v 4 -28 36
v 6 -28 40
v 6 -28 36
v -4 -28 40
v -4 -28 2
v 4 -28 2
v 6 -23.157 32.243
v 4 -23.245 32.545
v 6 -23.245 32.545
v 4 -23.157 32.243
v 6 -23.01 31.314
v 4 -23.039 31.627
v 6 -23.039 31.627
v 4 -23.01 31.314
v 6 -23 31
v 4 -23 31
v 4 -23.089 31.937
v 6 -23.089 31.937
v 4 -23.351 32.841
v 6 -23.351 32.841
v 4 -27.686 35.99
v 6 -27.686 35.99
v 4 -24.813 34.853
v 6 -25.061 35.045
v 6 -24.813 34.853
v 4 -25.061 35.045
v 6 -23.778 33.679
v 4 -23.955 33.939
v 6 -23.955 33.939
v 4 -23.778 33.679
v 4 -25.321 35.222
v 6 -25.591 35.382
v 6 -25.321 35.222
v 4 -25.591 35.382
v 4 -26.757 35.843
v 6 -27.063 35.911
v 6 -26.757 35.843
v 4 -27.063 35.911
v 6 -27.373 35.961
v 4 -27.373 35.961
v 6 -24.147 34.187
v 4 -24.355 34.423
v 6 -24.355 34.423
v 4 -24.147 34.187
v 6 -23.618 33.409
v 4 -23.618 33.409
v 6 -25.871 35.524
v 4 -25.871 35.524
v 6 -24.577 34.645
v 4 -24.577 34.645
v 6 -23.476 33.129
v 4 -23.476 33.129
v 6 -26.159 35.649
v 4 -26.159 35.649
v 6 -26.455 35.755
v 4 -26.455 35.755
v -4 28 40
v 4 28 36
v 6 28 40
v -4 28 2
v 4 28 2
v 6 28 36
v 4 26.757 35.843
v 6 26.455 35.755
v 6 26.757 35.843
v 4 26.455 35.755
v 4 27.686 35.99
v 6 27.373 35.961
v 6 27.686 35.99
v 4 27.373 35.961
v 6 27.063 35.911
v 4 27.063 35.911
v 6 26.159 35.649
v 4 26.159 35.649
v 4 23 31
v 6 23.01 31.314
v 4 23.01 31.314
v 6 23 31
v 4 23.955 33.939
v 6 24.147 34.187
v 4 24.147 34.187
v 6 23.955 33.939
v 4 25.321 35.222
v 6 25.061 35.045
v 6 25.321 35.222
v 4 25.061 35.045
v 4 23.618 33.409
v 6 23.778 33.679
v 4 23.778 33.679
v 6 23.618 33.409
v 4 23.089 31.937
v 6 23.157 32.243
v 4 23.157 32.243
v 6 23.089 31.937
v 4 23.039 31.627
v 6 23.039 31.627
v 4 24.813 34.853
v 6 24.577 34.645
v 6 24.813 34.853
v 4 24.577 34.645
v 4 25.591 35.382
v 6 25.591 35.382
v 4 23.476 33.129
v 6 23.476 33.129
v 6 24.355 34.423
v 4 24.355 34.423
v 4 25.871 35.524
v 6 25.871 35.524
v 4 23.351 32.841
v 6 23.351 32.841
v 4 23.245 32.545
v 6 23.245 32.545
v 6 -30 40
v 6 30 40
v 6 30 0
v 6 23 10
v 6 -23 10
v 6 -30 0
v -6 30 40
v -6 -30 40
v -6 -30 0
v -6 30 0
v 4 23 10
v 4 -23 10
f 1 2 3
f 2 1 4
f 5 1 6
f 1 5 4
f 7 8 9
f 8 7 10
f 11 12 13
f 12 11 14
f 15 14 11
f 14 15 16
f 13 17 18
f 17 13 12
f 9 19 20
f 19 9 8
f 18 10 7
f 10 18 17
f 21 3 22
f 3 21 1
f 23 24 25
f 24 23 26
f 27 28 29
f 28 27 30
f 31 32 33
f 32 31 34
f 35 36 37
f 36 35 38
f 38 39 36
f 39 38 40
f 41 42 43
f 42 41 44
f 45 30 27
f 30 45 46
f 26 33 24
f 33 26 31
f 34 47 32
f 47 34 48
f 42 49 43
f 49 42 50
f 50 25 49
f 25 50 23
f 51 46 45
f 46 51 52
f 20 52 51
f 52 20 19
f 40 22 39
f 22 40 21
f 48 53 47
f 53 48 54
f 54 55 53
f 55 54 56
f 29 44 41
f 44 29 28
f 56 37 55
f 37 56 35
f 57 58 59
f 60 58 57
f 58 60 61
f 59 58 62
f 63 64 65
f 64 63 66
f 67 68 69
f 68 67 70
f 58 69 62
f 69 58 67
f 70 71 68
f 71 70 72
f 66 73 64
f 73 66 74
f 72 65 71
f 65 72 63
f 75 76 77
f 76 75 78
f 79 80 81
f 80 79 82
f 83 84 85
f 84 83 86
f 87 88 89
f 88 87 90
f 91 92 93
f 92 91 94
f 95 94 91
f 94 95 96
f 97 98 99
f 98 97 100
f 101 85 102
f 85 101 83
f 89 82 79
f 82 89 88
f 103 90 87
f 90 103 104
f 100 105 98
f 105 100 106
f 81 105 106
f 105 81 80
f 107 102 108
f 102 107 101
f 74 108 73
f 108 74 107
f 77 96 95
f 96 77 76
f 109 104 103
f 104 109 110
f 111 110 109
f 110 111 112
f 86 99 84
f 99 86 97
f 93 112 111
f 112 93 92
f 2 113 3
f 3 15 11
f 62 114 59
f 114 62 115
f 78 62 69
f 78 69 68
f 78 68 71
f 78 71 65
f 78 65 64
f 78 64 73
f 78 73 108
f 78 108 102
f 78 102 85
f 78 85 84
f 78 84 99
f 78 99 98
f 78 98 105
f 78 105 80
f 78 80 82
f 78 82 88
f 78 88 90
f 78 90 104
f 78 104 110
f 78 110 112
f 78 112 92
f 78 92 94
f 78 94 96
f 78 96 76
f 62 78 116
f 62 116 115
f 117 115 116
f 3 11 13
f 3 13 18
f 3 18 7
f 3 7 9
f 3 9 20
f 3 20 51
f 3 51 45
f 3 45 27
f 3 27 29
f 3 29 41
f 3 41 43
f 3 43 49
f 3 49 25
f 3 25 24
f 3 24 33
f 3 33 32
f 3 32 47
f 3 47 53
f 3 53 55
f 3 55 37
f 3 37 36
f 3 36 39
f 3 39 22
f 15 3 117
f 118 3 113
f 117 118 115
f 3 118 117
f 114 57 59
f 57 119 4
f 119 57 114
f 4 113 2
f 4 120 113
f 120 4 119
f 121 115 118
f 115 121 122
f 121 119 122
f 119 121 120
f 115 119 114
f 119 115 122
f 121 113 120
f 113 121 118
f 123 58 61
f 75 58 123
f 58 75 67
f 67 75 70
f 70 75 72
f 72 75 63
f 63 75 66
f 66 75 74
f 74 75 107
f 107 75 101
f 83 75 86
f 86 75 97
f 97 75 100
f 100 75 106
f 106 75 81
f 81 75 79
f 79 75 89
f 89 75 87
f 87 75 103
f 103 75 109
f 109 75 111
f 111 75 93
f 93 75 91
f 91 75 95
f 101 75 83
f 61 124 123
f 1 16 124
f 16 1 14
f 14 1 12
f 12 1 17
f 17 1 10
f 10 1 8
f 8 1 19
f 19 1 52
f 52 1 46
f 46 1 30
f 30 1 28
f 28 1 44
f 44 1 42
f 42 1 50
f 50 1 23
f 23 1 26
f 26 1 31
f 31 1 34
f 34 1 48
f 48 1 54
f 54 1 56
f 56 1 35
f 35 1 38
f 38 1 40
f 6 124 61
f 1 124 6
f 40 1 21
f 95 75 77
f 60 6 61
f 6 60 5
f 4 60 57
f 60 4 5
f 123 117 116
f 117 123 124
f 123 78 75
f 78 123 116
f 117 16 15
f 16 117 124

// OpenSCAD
$fn = 100;
difference(){
    translate([-6,-30,0]) {
        cube([12,60,40]);
    };

    translate([-4,-28,2]) {
        cube([8,56,125]);
    };

    translate([1,-23,10]) {
        cube([6,46,35]);
    };
    translate([0,-28,31]){
        rotate([90,0,90]){
            difference(){
                cube(10);
                cylinder(h=12, r=5);
            }
        }
    };
    translate([0,28,31]) {
        rotate([270,-90,270]){
            difference(){
                cube(10);
                cylinder(h=12, r=5);
            }
        }
    };
}
